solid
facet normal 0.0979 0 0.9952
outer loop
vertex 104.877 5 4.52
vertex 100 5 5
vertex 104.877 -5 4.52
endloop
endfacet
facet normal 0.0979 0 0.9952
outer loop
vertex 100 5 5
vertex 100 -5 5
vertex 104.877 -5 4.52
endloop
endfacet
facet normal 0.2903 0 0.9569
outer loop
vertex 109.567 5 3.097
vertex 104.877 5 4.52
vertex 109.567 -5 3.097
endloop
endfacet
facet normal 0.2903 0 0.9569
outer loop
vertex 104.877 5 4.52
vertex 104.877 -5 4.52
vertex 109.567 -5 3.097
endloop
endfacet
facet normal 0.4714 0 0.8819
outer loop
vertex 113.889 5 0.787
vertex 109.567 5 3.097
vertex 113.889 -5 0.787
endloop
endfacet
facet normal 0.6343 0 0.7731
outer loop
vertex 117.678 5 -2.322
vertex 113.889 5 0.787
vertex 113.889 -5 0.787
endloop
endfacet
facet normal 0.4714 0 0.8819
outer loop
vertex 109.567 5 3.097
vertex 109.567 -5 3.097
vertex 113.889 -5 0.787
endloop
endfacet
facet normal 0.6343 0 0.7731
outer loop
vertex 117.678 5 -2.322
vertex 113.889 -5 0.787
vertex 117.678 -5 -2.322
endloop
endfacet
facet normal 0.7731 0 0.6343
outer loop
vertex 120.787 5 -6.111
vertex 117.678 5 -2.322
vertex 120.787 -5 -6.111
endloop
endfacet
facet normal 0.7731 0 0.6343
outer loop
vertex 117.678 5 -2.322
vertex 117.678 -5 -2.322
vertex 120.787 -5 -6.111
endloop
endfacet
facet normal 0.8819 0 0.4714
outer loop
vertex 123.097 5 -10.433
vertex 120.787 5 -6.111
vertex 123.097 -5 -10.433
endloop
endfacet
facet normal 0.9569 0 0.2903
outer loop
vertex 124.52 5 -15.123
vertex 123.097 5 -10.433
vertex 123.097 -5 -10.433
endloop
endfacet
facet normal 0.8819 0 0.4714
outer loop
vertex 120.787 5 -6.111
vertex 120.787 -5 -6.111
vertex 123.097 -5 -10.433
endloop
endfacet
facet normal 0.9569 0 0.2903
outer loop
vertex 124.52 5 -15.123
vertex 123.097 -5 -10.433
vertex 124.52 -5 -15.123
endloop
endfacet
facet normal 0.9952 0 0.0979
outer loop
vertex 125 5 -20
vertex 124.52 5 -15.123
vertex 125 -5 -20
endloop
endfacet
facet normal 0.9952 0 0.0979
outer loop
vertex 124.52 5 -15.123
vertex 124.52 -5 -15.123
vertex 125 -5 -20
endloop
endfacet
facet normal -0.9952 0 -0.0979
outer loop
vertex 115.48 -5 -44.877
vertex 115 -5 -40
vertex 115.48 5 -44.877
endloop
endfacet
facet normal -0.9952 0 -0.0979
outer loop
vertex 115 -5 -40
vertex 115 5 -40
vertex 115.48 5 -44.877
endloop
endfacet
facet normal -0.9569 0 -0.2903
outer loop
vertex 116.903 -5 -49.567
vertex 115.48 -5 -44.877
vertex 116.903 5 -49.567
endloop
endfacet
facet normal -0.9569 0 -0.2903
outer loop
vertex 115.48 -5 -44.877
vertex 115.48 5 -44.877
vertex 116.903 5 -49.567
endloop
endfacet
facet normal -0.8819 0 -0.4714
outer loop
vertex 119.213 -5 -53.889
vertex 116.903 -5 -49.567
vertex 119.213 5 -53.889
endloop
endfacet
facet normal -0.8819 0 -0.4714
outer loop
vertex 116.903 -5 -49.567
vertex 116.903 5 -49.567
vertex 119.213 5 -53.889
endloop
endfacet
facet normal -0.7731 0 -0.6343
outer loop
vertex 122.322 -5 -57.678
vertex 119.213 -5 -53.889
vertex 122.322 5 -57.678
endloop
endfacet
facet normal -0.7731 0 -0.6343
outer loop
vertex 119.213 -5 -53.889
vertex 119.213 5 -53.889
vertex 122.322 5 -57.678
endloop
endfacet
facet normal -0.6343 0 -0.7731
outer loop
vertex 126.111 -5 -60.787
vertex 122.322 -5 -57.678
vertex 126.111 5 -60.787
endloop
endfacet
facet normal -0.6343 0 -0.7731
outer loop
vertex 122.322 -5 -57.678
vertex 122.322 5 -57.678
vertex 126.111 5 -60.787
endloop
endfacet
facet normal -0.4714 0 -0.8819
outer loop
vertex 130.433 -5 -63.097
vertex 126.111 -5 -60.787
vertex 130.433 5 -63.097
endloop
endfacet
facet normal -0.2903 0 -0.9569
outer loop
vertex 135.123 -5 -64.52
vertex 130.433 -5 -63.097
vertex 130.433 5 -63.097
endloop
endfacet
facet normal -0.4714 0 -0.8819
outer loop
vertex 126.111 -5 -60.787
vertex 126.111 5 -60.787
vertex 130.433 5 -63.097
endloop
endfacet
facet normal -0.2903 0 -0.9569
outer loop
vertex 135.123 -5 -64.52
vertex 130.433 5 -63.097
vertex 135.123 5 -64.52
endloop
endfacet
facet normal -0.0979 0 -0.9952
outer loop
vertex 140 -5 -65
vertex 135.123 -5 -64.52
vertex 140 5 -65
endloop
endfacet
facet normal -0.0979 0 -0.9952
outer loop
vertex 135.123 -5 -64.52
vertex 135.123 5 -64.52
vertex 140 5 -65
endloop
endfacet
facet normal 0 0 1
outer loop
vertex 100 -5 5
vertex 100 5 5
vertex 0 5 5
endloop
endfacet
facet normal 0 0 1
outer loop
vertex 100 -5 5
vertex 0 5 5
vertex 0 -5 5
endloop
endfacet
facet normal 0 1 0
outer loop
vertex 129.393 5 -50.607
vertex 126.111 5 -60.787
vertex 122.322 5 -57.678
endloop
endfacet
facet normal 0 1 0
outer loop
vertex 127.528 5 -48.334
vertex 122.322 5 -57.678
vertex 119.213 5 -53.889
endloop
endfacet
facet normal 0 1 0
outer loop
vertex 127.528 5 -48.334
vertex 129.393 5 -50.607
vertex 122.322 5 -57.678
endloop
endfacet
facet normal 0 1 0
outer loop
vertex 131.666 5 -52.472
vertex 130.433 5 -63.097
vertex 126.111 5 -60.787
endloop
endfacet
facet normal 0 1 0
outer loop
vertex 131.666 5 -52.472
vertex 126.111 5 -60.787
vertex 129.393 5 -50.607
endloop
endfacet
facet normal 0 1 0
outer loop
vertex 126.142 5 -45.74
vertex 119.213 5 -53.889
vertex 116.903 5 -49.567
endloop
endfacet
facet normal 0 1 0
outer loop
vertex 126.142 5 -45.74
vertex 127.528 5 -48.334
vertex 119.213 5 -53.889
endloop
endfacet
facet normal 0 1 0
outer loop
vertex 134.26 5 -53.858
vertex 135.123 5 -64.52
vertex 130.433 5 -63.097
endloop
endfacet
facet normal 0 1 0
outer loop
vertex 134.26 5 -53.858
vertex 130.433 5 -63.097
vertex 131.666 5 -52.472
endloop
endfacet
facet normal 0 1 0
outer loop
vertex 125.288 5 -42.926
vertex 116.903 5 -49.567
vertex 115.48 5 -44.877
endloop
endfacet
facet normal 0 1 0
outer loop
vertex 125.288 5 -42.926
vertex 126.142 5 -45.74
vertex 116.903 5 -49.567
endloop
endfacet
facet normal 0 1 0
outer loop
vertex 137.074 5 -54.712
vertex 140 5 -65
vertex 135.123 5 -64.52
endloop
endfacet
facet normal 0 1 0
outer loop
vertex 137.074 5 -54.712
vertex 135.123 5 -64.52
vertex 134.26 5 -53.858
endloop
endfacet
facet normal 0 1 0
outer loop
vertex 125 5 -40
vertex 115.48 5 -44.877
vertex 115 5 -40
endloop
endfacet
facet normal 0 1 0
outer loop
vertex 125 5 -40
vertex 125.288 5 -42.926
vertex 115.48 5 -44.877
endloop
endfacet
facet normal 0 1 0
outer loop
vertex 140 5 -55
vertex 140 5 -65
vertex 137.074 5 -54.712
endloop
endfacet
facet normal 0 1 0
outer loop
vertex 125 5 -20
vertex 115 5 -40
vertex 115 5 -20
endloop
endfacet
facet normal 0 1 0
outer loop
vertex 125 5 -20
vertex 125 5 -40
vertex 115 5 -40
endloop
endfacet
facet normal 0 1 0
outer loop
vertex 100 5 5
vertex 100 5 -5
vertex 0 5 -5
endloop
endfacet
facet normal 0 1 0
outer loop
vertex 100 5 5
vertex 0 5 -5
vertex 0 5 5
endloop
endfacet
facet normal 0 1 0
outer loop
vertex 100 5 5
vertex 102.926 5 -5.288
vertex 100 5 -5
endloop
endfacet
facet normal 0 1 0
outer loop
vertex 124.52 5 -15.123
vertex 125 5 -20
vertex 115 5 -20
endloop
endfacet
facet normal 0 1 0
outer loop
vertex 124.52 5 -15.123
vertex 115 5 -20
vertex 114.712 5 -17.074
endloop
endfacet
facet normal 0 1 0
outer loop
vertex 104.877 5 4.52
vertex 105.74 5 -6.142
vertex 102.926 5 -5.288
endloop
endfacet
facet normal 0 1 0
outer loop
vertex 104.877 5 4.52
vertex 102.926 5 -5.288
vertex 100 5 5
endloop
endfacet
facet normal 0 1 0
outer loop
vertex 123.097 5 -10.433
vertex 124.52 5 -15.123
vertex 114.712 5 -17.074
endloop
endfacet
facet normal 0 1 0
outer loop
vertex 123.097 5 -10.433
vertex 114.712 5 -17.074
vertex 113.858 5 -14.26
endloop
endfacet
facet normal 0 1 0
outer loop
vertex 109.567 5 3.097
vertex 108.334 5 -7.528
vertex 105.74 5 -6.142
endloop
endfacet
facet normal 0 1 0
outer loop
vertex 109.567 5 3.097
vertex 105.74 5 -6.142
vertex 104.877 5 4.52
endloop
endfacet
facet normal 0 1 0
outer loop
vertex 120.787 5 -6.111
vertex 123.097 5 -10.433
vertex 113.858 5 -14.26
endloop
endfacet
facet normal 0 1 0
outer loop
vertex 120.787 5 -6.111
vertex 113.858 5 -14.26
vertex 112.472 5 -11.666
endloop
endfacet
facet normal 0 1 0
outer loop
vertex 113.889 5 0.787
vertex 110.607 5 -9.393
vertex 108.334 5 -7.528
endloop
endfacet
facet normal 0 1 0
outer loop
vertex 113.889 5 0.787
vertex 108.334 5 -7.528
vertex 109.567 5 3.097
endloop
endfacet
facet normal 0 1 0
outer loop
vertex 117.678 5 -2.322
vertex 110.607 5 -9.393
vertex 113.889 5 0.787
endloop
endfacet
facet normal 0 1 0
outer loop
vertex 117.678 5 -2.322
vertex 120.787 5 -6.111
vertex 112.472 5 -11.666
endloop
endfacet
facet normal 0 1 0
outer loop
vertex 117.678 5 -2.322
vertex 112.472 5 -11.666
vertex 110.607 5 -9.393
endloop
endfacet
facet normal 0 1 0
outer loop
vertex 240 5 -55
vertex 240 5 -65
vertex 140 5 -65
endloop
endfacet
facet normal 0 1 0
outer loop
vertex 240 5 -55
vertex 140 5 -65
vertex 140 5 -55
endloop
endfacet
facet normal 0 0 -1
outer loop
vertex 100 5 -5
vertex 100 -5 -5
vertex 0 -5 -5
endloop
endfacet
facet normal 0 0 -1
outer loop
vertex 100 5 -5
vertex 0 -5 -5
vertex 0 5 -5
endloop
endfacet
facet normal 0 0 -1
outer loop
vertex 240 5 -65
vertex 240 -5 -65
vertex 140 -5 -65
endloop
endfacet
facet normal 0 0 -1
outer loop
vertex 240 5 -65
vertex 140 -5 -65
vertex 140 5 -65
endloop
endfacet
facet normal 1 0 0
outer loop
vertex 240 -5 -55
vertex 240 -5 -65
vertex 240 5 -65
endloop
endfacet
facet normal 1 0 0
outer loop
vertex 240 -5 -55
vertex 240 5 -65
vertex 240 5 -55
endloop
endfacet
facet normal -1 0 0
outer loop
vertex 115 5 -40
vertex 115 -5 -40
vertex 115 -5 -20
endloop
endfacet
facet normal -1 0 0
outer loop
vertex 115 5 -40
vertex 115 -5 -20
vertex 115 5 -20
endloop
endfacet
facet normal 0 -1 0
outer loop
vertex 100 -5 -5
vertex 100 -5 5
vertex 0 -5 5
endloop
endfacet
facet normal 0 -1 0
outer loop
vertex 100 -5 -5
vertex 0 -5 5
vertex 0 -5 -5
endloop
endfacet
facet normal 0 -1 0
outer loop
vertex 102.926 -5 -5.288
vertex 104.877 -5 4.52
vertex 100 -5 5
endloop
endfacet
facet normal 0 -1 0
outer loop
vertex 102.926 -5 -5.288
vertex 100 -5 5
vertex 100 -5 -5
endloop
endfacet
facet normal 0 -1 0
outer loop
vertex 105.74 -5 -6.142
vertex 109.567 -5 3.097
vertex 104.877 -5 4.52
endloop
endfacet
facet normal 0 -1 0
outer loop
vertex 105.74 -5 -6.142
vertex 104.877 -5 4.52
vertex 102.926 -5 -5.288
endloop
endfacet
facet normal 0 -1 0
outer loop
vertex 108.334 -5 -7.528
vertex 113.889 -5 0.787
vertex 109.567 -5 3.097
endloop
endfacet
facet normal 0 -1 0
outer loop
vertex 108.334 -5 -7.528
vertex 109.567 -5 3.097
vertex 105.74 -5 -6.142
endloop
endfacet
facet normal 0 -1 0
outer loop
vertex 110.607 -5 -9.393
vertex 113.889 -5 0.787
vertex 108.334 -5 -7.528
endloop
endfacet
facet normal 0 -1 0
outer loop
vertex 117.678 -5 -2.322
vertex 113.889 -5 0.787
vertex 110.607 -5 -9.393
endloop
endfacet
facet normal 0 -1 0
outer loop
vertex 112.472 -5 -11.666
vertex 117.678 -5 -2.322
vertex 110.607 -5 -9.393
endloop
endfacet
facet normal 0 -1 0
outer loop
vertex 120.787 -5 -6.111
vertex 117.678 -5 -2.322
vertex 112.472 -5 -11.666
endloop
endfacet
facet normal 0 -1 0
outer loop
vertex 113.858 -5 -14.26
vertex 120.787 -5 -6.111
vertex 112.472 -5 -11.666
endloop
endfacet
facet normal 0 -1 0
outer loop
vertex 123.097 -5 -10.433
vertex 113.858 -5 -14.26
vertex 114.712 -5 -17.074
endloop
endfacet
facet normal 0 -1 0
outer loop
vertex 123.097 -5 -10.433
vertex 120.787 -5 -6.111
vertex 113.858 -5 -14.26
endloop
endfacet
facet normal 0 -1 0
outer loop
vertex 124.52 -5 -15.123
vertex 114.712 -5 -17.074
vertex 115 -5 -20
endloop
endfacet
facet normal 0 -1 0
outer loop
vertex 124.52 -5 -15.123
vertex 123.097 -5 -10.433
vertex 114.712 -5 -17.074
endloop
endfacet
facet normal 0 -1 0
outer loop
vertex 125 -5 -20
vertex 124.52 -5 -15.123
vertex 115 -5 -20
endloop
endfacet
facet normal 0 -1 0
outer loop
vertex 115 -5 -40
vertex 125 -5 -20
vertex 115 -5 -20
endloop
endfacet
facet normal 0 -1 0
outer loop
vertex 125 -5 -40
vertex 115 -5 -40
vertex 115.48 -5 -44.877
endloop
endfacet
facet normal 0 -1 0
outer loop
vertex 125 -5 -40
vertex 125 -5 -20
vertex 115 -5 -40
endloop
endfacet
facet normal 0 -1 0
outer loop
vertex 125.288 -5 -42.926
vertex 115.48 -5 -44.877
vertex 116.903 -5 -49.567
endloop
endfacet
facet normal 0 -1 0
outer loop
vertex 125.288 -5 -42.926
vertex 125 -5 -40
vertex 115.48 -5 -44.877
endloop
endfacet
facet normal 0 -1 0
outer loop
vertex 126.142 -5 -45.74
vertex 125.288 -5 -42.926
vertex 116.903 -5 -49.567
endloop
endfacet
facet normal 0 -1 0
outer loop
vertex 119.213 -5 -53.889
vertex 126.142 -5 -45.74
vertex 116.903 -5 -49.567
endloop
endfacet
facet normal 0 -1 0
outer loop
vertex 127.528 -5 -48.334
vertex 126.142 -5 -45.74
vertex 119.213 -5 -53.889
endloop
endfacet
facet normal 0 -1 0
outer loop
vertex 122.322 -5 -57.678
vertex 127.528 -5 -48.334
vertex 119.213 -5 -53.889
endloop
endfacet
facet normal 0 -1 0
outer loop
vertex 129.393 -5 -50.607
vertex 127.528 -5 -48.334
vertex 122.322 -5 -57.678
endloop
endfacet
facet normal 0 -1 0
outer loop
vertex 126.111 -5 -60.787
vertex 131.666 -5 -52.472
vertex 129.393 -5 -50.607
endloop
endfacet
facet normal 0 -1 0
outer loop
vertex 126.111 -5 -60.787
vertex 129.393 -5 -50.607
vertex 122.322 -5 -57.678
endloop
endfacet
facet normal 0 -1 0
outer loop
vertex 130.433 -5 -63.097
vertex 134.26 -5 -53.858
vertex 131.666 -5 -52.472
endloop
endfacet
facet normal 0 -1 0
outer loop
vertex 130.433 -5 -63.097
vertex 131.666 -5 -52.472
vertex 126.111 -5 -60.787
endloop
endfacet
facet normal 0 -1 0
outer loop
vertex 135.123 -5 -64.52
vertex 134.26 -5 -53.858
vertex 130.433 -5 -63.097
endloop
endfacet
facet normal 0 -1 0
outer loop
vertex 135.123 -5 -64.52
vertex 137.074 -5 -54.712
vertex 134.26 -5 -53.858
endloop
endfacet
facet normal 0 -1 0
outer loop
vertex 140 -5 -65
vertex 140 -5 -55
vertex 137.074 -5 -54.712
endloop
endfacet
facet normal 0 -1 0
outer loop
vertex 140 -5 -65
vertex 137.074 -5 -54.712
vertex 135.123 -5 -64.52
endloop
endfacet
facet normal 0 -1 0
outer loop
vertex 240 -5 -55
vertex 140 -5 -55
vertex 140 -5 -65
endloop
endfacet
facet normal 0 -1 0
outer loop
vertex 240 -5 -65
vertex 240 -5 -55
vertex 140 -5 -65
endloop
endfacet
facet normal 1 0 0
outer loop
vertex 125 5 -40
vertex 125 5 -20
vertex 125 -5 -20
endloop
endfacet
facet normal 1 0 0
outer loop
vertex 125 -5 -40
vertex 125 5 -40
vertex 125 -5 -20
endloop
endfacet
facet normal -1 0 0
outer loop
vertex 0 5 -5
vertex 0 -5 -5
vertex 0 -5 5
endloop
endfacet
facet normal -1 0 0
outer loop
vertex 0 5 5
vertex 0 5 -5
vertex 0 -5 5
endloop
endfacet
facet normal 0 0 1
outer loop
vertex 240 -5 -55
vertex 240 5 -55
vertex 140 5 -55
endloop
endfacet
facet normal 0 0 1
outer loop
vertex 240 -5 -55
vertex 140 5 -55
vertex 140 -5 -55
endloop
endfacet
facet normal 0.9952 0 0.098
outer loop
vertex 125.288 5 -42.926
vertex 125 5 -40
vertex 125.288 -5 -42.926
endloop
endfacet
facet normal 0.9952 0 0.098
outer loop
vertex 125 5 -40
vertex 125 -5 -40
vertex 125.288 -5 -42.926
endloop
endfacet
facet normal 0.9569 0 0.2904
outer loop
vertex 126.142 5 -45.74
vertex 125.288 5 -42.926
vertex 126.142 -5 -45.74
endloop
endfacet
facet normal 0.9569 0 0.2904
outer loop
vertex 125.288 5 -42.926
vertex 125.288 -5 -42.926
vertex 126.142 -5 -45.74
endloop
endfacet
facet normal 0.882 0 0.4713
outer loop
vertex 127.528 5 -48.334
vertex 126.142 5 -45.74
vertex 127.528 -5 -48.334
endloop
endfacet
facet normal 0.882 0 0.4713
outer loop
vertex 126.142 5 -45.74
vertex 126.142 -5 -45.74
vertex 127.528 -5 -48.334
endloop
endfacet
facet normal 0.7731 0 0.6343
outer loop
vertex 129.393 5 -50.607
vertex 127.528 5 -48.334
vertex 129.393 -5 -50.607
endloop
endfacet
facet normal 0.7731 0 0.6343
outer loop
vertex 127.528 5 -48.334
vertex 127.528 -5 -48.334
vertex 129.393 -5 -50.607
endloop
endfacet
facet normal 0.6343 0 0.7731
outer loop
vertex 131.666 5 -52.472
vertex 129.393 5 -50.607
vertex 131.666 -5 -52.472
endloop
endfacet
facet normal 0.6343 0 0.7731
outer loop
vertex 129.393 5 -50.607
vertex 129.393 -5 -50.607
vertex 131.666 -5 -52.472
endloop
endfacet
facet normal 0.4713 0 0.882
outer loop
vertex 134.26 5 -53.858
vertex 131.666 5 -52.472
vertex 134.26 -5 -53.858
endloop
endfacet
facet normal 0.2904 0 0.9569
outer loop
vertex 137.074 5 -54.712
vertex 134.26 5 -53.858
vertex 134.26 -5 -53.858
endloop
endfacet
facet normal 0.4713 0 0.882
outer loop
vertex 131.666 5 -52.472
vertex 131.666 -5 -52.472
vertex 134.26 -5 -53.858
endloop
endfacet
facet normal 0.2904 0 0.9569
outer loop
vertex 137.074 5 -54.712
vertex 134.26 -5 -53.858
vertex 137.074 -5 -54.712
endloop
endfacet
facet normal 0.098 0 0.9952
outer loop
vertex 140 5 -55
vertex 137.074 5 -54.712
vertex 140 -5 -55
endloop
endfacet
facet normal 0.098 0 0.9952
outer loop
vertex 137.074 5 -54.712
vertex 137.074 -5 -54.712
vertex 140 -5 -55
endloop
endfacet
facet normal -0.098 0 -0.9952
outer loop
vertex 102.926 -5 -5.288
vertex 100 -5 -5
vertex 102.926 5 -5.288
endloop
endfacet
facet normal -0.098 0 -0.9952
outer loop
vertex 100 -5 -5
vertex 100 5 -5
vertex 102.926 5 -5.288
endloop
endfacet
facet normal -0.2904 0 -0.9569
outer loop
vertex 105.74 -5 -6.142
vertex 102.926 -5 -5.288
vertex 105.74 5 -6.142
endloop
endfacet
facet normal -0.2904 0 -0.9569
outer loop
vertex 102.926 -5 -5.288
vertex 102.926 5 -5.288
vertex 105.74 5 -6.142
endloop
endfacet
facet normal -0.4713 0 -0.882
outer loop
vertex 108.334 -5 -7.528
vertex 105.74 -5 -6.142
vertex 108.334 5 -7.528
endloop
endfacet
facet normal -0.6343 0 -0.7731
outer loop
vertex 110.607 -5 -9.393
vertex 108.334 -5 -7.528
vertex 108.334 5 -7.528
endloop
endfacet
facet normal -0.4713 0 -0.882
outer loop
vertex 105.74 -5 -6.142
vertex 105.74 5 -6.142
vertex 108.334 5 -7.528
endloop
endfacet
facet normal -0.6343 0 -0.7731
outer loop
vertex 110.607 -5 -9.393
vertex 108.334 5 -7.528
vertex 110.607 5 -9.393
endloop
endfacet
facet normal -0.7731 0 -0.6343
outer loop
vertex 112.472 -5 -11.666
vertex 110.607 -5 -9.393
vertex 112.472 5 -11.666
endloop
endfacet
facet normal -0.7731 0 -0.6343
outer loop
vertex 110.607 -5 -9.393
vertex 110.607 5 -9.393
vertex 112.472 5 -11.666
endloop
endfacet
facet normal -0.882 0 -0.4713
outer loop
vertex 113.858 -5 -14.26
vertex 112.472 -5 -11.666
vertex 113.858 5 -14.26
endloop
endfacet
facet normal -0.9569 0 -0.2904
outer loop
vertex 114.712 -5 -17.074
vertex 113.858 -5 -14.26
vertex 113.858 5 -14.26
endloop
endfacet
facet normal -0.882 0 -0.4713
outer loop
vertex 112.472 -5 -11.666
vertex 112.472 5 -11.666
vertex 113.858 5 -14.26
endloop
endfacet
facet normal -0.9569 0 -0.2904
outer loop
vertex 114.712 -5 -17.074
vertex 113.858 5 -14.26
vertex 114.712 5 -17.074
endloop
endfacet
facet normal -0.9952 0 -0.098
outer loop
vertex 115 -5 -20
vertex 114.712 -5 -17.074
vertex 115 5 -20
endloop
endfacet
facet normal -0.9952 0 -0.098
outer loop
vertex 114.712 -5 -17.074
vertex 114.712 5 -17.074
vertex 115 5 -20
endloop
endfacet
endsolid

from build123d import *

# Parameters (mm, degrees)
SKETCH3_W = 10
SKETCH3_H = 10


with BuildPart() as part:
    # Sweep3: sweep along a path in Sketch1
    with BuildLine(Plane(origin=(0, 0, 0), x_dir=(1, 0, 0), z_dir=(0, 1, 0))) as sweep3_path:
        Line((0, 0), (100, 0))
        ThreePointArc((100, 0), (114.142135624, 5.857864376), (120, 20))
        Line((120, 20), (120, 40))
        ThreePointArc((120, 40), (125.857864376, 54.142135624), (140, 60))
        Line((140, 60), (240, 60))
    # Sketch3 → Sweep3 (sweep)
    with BuildSketch(Plane(origin=(0, 0, 0), x_dir=(0, 0, -1), z_dir=(1, 0, 0))):
        Rectangle(SKETCH3_W, SKETCH3_H)
    sweep(path=sweep3_path.line)


solid = part.part
